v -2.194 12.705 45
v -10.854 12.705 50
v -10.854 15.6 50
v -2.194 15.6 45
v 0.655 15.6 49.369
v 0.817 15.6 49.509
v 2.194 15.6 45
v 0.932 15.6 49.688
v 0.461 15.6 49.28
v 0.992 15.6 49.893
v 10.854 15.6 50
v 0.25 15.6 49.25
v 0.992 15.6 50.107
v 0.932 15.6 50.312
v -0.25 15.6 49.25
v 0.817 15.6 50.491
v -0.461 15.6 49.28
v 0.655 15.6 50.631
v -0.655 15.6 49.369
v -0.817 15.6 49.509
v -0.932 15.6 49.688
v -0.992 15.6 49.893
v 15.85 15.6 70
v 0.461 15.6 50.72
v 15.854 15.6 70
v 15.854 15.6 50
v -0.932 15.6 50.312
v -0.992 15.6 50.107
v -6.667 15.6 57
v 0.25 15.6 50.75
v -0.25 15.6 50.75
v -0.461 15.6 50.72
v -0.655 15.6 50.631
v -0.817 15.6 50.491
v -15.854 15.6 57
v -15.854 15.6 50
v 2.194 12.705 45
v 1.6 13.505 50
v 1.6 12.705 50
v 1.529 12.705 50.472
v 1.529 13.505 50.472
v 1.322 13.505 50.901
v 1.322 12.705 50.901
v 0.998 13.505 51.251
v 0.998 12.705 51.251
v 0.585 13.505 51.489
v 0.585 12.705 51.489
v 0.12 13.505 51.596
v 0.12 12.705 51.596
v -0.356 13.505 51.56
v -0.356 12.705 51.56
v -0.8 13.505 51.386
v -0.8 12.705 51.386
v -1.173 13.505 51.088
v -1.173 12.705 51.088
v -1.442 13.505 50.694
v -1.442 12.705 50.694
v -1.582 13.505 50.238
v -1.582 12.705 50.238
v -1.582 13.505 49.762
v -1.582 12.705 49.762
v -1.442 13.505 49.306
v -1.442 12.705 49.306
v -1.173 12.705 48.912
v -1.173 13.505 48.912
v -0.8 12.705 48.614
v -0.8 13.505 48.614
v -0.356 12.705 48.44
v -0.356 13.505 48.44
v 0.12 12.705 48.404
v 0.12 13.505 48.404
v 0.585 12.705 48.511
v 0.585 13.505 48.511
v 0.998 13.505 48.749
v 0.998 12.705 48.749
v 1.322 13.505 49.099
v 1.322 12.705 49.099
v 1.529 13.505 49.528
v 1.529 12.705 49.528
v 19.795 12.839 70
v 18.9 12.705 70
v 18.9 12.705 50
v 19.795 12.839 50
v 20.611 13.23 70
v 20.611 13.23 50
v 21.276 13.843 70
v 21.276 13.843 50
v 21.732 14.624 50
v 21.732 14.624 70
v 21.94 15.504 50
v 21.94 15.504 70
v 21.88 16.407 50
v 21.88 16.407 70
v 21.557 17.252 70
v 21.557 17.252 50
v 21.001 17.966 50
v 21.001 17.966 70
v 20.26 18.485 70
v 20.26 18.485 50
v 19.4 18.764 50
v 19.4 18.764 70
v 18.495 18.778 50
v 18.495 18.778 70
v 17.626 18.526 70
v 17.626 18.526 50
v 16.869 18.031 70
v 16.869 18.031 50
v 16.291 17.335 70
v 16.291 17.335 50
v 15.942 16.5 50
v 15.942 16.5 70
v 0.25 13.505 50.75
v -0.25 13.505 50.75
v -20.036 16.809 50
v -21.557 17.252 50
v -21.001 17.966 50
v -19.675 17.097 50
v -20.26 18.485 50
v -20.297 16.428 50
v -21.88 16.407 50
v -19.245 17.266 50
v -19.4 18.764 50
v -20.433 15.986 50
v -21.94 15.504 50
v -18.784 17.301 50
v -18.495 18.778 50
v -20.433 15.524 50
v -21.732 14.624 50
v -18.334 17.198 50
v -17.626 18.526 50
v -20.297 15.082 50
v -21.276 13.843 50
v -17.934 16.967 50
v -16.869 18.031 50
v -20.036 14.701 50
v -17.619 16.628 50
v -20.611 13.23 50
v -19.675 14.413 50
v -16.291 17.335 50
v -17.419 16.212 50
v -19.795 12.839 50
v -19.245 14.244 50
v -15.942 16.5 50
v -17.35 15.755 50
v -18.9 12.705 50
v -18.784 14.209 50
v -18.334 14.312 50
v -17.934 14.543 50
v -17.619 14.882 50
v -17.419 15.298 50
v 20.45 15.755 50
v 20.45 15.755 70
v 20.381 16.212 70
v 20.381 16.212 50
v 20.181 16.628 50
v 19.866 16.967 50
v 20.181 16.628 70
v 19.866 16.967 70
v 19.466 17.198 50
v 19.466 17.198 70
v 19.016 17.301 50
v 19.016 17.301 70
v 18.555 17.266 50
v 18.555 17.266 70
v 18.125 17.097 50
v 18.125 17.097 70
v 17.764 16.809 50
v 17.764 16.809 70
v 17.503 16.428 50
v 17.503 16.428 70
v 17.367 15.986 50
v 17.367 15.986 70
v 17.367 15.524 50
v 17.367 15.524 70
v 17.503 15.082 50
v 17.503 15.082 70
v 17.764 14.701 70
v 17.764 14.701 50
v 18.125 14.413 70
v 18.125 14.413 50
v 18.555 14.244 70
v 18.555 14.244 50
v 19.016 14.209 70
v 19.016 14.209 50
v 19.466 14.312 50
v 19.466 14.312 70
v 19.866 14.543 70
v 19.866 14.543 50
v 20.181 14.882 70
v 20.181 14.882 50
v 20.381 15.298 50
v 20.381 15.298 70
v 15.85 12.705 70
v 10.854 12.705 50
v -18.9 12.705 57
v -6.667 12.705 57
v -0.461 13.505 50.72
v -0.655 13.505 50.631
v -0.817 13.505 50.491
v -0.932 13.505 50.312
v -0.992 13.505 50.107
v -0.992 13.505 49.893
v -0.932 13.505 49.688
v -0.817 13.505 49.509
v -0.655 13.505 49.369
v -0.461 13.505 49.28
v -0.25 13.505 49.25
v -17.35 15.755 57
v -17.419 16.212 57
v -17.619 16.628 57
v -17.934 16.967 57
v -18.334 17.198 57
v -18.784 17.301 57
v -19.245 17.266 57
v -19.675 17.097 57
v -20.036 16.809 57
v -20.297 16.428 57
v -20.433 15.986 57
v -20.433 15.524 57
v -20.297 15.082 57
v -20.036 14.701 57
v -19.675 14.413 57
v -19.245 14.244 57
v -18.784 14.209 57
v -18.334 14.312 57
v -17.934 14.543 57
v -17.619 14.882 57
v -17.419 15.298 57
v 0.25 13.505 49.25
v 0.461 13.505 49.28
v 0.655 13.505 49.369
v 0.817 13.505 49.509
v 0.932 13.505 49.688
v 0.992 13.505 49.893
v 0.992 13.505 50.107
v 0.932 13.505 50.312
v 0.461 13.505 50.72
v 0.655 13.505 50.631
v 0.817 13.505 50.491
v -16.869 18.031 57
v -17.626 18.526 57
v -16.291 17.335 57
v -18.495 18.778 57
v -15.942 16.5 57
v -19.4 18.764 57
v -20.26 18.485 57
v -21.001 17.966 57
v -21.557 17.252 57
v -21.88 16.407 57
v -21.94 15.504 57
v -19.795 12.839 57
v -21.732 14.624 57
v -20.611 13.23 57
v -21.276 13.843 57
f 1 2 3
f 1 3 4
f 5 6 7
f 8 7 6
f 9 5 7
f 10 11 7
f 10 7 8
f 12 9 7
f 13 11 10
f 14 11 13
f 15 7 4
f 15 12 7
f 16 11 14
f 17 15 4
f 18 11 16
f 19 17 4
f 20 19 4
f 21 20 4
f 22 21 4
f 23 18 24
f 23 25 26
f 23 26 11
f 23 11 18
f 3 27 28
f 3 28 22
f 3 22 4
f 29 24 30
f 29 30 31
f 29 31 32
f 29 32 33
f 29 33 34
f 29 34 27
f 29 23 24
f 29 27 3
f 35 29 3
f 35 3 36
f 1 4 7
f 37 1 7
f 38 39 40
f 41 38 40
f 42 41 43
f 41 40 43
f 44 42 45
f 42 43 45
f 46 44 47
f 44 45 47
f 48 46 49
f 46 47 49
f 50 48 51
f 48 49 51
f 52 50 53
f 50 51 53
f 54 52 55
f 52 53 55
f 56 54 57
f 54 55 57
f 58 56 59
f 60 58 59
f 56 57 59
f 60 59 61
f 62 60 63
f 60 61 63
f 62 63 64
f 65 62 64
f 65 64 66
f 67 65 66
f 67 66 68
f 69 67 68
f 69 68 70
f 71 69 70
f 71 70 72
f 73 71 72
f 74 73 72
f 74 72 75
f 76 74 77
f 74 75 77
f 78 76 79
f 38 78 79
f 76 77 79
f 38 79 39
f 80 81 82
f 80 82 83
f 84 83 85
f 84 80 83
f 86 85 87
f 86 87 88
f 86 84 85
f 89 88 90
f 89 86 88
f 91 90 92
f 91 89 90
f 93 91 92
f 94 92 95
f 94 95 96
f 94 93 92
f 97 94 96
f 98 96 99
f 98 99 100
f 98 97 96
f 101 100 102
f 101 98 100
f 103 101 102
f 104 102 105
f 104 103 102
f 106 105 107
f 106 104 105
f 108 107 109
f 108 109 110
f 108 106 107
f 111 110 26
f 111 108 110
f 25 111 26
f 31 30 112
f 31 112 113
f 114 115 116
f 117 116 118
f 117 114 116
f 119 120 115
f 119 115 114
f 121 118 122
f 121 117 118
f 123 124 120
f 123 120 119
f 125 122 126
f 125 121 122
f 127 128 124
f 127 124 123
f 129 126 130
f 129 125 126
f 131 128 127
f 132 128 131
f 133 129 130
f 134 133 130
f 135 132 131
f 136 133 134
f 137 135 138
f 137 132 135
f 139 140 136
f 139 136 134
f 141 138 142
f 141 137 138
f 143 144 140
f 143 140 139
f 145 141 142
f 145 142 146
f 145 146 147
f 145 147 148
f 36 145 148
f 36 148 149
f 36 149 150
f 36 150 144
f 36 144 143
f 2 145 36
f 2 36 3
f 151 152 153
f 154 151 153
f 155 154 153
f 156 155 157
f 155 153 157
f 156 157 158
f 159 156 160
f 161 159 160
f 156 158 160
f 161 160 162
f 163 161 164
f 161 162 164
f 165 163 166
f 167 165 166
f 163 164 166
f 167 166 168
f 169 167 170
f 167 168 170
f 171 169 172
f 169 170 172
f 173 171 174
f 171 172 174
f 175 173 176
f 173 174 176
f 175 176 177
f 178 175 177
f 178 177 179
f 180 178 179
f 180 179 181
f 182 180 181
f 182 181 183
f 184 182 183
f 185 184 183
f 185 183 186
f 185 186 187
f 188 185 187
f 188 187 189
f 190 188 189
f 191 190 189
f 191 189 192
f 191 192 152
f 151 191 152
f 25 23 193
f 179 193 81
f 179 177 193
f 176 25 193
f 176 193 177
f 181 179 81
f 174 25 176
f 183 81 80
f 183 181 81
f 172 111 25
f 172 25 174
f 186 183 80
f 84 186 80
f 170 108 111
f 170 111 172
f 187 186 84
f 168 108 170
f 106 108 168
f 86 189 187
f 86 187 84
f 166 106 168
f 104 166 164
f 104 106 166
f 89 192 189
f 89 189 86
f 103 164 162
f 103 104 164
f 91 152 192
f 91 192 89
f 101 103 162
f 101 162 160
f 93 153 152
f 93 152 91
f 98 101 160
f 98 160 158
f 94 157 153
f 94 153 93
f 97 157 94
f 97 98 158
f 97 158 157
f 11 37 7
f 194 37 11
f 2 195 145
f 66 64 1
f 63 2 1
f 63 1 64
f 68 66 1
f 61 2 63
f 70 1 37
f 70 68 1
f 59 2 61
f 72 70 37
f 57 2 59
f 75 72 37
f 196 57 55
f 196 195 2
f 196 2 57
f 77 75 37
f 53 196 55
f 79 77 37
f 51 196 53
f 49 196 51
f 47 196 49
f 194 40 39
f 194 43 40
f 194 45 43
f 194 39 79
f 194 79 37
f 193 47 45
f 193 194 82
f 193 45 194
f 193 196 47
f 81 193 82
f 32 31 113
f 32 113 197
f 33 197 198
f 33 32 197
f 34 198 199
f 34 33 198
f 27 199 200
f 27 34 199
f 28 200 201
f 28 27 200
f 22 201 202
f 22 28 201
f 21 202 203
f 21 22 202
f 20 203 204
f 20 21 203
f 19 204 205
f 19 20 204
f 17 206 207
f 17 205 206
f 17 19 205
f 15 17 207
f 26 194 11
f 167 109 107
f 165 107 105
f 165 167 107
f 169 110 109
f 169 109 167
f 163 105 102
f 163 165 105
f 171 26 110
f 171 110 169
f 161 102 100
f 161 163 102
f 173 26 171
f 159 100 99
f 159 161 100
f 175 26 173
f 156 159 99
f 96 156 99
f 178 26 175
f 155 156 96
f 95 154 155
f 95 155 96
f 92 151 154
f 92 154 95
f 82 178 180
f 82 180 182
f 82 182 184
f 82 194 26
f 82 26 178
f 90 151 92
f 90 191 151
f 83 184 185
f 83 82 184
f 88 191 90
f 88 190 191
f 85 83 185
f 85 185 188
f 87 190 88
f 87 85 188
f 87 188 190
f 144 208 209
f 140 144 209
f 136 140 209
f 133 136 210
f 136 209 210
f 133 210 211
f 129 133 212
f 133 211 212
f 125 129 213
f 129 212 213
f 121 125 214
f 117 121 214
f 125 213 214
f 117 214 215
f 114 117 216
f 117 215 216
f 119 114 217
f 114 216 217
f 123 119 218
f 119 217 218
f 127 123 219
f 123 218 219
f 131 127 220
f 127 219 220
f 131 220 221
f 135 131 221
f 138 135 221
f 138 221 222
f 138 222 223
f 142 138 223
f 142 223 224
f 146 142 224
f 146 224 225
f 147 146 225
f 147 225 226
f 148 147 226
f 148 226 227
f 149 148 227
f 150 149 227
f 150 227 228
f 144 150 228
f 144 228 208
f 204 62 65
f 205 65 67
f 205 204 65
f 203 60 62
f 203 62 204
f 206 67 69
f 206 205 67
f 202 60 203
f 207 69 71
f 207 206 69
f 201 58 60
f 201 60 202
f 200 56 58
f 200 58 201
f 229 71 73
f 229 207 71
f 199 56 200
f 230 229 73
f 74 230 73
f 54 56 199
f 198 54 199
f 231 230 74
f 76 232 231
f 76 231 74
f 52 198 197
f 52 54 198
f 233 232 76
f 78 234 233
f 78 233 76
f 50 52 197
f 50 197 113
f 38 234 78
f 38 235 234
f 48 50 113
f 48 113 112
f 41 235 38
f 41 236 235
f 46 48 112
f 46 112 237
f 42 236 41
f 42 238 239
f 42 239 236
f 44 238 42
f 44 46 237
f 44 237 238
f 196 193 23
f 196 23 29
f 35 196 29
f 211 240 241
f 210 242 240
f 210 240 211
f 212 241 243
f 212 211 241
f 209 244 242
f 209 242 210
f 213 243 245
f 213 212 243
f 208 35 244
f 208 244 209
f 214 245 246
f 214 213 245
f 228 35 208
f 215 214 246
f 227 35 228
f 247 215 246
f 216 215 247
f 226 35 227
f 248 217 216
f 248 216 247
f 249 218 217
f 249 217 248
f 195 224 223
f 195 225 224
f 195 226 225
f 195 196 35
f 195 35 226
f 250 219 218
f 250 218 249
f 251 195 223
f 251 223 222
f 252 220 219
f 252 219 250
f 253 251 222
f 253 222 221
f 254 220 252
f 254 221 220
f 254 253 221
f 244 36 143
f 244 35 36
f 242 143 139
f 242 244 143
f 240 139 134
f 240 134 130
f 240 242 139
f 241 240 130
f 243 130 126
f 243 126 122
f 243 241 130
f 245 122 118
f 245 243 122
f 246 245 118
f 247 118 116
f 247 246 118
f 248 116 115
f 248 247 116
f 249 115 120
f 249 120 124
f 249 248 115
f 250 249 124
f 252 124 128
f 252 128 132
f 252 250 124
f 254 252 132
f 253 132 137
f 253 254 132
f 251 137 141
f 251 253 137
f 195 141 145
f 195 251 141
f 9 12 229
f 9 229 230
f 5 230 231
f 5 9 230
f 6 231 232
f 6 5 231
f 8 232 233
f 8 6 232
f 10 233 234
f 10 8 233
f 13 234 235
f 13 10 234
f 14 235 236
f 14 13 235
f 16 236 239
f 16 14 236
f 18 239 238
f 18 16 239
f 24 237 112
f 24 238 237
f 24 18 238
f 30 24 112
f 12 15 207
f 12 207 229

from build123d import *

# Parameters (mm, degrees)
SKETCH_2_R           = 3.05
SKETCH_2_R_2         = 1.55
EXTRUDE_1_DEPTH      = 25
CUT_EXTRUDE_3_DEPTH  = 74.430746455
SKETCH_8_R           = 1.6
CUT_EXTRUDE_4_DEPTH  = 0.8
CUT_EXTRUDE_START    = -2.895
CUT_EXTRUDE_10_DEPTH = 6.1


# Read off the part's stored shape, not the designer's step: the extrude step
with BuildPart() as part:
    # 草图2 → 凸台-拉伸1 (new body)
    # profile 1 of 4: a face of its own
    with BuildSketch(Plane.XY.offset(70)):
        with Locations((-18.9, 15.755)):
            Circle(SKETCH_2_R)
        with Locations((-18.9, 15.755)):
            Circle(SKETCH_2_R_2, mode=Mode.SUBTRACT)
    # profile 2 of 4: a face of its own
    with BuildSketch(Plane.XY.offset(70)):
        with BuildLine():
            Line((0, 12.705), (0, 15.6))
            Line((0, 15.6), (-15.853941071, 15.6))
            ThreePointArc((-15.853941071, 15.6), (-16.798839606, 13.544202633), (-18.9, 12.705))
            Line((-18.9, 12.705), (0, 12.705))
        make_face()
    # profile 3 of 4: a face of its own
    with BuildSketch(Plane.XY.offset(70)):
        with BuildLine():
            Line((15.853941071, 15.6), (0, 15.6))
            Line((0, 15.6), (0, 12.705))
            Line((0, 12.705), (18.9, 12.705))
            ThreePointArc((18.9, 12.705), (16.798839606, 13.544202633), (15.853941071, 15.6))
        make_face()
    # profile 4 of 4: a face of its own
    with BuildSketch(Plane.XY.offset(70)):
        with Locations((18.9, 15.755)):
            Circle(SKETCH_2_R)
        with Locations((18.9, 15.755)):
            Circle(SKETCH_2_R_2, mode=Mode.SUBTRACT)
    extrude(amount=-EXTRUDE_1_DEPTH)

    # 草图7 → 切除-拉伸3 (cut, through all)
    with BuildSketch(Plane(origin=(0, 15.6, 0), x_dir=(1, 0, 0), z_dir=(0, 1, 0))):
        with BuildLine():
            Line((0.25, -50.75), (-0.25, -50.75))
            ThreePointArc((-0.25, -50.75), (-1, -50), (-0.25, -49.25))
            Line((-0.25, -49.25), (0.25, -49.25))
            ThreePointArc((0.25, -49.25), (1, -50), (0.25, -50.75))
        make_face()
    extrude(amount=-CUT_EXTRUDE_3_DEPTH, mode=Mode.SUBTRACT)

    # 草图8 → 切除-拉伸4 (cut)
    with BuildSketch(Plane.XZ.offset(-12.705)):
        with Locations((0, 50)):
            Circle(SKETCH_8_R)
    extrude(amount=-CUT_EXTRUDE_4_DEPTH, mode=Mode.SUBTRACT)

    # 切除-拉伸10 outline → 切除-拉伸10 (cut)
    with BuildSketch(Plane(origin=(0, 15.6, 0), x_dir=(1, 0, 0), z_dir=(0, 1, 0)).offset(CUT_EXTRUDE_START)):
        Polygon((-6.666660498, -57), (-21.95, -57), (-21.95, -70), (15.85, -70), align=None)
        Polygon((-21.95, -50), (-10.853941071, -50), (-2.193687033, -45), (-21.95, -45), align=None)
        Polygon((10.853941071, -50), (21.95, -50), (21.95, -45), (2.193687033, -45), align=None)
    extrude(amount=CUT_EXTRUDE_10_DEPTH, mode=Mode.SUBTRACT)


solid = part.part
